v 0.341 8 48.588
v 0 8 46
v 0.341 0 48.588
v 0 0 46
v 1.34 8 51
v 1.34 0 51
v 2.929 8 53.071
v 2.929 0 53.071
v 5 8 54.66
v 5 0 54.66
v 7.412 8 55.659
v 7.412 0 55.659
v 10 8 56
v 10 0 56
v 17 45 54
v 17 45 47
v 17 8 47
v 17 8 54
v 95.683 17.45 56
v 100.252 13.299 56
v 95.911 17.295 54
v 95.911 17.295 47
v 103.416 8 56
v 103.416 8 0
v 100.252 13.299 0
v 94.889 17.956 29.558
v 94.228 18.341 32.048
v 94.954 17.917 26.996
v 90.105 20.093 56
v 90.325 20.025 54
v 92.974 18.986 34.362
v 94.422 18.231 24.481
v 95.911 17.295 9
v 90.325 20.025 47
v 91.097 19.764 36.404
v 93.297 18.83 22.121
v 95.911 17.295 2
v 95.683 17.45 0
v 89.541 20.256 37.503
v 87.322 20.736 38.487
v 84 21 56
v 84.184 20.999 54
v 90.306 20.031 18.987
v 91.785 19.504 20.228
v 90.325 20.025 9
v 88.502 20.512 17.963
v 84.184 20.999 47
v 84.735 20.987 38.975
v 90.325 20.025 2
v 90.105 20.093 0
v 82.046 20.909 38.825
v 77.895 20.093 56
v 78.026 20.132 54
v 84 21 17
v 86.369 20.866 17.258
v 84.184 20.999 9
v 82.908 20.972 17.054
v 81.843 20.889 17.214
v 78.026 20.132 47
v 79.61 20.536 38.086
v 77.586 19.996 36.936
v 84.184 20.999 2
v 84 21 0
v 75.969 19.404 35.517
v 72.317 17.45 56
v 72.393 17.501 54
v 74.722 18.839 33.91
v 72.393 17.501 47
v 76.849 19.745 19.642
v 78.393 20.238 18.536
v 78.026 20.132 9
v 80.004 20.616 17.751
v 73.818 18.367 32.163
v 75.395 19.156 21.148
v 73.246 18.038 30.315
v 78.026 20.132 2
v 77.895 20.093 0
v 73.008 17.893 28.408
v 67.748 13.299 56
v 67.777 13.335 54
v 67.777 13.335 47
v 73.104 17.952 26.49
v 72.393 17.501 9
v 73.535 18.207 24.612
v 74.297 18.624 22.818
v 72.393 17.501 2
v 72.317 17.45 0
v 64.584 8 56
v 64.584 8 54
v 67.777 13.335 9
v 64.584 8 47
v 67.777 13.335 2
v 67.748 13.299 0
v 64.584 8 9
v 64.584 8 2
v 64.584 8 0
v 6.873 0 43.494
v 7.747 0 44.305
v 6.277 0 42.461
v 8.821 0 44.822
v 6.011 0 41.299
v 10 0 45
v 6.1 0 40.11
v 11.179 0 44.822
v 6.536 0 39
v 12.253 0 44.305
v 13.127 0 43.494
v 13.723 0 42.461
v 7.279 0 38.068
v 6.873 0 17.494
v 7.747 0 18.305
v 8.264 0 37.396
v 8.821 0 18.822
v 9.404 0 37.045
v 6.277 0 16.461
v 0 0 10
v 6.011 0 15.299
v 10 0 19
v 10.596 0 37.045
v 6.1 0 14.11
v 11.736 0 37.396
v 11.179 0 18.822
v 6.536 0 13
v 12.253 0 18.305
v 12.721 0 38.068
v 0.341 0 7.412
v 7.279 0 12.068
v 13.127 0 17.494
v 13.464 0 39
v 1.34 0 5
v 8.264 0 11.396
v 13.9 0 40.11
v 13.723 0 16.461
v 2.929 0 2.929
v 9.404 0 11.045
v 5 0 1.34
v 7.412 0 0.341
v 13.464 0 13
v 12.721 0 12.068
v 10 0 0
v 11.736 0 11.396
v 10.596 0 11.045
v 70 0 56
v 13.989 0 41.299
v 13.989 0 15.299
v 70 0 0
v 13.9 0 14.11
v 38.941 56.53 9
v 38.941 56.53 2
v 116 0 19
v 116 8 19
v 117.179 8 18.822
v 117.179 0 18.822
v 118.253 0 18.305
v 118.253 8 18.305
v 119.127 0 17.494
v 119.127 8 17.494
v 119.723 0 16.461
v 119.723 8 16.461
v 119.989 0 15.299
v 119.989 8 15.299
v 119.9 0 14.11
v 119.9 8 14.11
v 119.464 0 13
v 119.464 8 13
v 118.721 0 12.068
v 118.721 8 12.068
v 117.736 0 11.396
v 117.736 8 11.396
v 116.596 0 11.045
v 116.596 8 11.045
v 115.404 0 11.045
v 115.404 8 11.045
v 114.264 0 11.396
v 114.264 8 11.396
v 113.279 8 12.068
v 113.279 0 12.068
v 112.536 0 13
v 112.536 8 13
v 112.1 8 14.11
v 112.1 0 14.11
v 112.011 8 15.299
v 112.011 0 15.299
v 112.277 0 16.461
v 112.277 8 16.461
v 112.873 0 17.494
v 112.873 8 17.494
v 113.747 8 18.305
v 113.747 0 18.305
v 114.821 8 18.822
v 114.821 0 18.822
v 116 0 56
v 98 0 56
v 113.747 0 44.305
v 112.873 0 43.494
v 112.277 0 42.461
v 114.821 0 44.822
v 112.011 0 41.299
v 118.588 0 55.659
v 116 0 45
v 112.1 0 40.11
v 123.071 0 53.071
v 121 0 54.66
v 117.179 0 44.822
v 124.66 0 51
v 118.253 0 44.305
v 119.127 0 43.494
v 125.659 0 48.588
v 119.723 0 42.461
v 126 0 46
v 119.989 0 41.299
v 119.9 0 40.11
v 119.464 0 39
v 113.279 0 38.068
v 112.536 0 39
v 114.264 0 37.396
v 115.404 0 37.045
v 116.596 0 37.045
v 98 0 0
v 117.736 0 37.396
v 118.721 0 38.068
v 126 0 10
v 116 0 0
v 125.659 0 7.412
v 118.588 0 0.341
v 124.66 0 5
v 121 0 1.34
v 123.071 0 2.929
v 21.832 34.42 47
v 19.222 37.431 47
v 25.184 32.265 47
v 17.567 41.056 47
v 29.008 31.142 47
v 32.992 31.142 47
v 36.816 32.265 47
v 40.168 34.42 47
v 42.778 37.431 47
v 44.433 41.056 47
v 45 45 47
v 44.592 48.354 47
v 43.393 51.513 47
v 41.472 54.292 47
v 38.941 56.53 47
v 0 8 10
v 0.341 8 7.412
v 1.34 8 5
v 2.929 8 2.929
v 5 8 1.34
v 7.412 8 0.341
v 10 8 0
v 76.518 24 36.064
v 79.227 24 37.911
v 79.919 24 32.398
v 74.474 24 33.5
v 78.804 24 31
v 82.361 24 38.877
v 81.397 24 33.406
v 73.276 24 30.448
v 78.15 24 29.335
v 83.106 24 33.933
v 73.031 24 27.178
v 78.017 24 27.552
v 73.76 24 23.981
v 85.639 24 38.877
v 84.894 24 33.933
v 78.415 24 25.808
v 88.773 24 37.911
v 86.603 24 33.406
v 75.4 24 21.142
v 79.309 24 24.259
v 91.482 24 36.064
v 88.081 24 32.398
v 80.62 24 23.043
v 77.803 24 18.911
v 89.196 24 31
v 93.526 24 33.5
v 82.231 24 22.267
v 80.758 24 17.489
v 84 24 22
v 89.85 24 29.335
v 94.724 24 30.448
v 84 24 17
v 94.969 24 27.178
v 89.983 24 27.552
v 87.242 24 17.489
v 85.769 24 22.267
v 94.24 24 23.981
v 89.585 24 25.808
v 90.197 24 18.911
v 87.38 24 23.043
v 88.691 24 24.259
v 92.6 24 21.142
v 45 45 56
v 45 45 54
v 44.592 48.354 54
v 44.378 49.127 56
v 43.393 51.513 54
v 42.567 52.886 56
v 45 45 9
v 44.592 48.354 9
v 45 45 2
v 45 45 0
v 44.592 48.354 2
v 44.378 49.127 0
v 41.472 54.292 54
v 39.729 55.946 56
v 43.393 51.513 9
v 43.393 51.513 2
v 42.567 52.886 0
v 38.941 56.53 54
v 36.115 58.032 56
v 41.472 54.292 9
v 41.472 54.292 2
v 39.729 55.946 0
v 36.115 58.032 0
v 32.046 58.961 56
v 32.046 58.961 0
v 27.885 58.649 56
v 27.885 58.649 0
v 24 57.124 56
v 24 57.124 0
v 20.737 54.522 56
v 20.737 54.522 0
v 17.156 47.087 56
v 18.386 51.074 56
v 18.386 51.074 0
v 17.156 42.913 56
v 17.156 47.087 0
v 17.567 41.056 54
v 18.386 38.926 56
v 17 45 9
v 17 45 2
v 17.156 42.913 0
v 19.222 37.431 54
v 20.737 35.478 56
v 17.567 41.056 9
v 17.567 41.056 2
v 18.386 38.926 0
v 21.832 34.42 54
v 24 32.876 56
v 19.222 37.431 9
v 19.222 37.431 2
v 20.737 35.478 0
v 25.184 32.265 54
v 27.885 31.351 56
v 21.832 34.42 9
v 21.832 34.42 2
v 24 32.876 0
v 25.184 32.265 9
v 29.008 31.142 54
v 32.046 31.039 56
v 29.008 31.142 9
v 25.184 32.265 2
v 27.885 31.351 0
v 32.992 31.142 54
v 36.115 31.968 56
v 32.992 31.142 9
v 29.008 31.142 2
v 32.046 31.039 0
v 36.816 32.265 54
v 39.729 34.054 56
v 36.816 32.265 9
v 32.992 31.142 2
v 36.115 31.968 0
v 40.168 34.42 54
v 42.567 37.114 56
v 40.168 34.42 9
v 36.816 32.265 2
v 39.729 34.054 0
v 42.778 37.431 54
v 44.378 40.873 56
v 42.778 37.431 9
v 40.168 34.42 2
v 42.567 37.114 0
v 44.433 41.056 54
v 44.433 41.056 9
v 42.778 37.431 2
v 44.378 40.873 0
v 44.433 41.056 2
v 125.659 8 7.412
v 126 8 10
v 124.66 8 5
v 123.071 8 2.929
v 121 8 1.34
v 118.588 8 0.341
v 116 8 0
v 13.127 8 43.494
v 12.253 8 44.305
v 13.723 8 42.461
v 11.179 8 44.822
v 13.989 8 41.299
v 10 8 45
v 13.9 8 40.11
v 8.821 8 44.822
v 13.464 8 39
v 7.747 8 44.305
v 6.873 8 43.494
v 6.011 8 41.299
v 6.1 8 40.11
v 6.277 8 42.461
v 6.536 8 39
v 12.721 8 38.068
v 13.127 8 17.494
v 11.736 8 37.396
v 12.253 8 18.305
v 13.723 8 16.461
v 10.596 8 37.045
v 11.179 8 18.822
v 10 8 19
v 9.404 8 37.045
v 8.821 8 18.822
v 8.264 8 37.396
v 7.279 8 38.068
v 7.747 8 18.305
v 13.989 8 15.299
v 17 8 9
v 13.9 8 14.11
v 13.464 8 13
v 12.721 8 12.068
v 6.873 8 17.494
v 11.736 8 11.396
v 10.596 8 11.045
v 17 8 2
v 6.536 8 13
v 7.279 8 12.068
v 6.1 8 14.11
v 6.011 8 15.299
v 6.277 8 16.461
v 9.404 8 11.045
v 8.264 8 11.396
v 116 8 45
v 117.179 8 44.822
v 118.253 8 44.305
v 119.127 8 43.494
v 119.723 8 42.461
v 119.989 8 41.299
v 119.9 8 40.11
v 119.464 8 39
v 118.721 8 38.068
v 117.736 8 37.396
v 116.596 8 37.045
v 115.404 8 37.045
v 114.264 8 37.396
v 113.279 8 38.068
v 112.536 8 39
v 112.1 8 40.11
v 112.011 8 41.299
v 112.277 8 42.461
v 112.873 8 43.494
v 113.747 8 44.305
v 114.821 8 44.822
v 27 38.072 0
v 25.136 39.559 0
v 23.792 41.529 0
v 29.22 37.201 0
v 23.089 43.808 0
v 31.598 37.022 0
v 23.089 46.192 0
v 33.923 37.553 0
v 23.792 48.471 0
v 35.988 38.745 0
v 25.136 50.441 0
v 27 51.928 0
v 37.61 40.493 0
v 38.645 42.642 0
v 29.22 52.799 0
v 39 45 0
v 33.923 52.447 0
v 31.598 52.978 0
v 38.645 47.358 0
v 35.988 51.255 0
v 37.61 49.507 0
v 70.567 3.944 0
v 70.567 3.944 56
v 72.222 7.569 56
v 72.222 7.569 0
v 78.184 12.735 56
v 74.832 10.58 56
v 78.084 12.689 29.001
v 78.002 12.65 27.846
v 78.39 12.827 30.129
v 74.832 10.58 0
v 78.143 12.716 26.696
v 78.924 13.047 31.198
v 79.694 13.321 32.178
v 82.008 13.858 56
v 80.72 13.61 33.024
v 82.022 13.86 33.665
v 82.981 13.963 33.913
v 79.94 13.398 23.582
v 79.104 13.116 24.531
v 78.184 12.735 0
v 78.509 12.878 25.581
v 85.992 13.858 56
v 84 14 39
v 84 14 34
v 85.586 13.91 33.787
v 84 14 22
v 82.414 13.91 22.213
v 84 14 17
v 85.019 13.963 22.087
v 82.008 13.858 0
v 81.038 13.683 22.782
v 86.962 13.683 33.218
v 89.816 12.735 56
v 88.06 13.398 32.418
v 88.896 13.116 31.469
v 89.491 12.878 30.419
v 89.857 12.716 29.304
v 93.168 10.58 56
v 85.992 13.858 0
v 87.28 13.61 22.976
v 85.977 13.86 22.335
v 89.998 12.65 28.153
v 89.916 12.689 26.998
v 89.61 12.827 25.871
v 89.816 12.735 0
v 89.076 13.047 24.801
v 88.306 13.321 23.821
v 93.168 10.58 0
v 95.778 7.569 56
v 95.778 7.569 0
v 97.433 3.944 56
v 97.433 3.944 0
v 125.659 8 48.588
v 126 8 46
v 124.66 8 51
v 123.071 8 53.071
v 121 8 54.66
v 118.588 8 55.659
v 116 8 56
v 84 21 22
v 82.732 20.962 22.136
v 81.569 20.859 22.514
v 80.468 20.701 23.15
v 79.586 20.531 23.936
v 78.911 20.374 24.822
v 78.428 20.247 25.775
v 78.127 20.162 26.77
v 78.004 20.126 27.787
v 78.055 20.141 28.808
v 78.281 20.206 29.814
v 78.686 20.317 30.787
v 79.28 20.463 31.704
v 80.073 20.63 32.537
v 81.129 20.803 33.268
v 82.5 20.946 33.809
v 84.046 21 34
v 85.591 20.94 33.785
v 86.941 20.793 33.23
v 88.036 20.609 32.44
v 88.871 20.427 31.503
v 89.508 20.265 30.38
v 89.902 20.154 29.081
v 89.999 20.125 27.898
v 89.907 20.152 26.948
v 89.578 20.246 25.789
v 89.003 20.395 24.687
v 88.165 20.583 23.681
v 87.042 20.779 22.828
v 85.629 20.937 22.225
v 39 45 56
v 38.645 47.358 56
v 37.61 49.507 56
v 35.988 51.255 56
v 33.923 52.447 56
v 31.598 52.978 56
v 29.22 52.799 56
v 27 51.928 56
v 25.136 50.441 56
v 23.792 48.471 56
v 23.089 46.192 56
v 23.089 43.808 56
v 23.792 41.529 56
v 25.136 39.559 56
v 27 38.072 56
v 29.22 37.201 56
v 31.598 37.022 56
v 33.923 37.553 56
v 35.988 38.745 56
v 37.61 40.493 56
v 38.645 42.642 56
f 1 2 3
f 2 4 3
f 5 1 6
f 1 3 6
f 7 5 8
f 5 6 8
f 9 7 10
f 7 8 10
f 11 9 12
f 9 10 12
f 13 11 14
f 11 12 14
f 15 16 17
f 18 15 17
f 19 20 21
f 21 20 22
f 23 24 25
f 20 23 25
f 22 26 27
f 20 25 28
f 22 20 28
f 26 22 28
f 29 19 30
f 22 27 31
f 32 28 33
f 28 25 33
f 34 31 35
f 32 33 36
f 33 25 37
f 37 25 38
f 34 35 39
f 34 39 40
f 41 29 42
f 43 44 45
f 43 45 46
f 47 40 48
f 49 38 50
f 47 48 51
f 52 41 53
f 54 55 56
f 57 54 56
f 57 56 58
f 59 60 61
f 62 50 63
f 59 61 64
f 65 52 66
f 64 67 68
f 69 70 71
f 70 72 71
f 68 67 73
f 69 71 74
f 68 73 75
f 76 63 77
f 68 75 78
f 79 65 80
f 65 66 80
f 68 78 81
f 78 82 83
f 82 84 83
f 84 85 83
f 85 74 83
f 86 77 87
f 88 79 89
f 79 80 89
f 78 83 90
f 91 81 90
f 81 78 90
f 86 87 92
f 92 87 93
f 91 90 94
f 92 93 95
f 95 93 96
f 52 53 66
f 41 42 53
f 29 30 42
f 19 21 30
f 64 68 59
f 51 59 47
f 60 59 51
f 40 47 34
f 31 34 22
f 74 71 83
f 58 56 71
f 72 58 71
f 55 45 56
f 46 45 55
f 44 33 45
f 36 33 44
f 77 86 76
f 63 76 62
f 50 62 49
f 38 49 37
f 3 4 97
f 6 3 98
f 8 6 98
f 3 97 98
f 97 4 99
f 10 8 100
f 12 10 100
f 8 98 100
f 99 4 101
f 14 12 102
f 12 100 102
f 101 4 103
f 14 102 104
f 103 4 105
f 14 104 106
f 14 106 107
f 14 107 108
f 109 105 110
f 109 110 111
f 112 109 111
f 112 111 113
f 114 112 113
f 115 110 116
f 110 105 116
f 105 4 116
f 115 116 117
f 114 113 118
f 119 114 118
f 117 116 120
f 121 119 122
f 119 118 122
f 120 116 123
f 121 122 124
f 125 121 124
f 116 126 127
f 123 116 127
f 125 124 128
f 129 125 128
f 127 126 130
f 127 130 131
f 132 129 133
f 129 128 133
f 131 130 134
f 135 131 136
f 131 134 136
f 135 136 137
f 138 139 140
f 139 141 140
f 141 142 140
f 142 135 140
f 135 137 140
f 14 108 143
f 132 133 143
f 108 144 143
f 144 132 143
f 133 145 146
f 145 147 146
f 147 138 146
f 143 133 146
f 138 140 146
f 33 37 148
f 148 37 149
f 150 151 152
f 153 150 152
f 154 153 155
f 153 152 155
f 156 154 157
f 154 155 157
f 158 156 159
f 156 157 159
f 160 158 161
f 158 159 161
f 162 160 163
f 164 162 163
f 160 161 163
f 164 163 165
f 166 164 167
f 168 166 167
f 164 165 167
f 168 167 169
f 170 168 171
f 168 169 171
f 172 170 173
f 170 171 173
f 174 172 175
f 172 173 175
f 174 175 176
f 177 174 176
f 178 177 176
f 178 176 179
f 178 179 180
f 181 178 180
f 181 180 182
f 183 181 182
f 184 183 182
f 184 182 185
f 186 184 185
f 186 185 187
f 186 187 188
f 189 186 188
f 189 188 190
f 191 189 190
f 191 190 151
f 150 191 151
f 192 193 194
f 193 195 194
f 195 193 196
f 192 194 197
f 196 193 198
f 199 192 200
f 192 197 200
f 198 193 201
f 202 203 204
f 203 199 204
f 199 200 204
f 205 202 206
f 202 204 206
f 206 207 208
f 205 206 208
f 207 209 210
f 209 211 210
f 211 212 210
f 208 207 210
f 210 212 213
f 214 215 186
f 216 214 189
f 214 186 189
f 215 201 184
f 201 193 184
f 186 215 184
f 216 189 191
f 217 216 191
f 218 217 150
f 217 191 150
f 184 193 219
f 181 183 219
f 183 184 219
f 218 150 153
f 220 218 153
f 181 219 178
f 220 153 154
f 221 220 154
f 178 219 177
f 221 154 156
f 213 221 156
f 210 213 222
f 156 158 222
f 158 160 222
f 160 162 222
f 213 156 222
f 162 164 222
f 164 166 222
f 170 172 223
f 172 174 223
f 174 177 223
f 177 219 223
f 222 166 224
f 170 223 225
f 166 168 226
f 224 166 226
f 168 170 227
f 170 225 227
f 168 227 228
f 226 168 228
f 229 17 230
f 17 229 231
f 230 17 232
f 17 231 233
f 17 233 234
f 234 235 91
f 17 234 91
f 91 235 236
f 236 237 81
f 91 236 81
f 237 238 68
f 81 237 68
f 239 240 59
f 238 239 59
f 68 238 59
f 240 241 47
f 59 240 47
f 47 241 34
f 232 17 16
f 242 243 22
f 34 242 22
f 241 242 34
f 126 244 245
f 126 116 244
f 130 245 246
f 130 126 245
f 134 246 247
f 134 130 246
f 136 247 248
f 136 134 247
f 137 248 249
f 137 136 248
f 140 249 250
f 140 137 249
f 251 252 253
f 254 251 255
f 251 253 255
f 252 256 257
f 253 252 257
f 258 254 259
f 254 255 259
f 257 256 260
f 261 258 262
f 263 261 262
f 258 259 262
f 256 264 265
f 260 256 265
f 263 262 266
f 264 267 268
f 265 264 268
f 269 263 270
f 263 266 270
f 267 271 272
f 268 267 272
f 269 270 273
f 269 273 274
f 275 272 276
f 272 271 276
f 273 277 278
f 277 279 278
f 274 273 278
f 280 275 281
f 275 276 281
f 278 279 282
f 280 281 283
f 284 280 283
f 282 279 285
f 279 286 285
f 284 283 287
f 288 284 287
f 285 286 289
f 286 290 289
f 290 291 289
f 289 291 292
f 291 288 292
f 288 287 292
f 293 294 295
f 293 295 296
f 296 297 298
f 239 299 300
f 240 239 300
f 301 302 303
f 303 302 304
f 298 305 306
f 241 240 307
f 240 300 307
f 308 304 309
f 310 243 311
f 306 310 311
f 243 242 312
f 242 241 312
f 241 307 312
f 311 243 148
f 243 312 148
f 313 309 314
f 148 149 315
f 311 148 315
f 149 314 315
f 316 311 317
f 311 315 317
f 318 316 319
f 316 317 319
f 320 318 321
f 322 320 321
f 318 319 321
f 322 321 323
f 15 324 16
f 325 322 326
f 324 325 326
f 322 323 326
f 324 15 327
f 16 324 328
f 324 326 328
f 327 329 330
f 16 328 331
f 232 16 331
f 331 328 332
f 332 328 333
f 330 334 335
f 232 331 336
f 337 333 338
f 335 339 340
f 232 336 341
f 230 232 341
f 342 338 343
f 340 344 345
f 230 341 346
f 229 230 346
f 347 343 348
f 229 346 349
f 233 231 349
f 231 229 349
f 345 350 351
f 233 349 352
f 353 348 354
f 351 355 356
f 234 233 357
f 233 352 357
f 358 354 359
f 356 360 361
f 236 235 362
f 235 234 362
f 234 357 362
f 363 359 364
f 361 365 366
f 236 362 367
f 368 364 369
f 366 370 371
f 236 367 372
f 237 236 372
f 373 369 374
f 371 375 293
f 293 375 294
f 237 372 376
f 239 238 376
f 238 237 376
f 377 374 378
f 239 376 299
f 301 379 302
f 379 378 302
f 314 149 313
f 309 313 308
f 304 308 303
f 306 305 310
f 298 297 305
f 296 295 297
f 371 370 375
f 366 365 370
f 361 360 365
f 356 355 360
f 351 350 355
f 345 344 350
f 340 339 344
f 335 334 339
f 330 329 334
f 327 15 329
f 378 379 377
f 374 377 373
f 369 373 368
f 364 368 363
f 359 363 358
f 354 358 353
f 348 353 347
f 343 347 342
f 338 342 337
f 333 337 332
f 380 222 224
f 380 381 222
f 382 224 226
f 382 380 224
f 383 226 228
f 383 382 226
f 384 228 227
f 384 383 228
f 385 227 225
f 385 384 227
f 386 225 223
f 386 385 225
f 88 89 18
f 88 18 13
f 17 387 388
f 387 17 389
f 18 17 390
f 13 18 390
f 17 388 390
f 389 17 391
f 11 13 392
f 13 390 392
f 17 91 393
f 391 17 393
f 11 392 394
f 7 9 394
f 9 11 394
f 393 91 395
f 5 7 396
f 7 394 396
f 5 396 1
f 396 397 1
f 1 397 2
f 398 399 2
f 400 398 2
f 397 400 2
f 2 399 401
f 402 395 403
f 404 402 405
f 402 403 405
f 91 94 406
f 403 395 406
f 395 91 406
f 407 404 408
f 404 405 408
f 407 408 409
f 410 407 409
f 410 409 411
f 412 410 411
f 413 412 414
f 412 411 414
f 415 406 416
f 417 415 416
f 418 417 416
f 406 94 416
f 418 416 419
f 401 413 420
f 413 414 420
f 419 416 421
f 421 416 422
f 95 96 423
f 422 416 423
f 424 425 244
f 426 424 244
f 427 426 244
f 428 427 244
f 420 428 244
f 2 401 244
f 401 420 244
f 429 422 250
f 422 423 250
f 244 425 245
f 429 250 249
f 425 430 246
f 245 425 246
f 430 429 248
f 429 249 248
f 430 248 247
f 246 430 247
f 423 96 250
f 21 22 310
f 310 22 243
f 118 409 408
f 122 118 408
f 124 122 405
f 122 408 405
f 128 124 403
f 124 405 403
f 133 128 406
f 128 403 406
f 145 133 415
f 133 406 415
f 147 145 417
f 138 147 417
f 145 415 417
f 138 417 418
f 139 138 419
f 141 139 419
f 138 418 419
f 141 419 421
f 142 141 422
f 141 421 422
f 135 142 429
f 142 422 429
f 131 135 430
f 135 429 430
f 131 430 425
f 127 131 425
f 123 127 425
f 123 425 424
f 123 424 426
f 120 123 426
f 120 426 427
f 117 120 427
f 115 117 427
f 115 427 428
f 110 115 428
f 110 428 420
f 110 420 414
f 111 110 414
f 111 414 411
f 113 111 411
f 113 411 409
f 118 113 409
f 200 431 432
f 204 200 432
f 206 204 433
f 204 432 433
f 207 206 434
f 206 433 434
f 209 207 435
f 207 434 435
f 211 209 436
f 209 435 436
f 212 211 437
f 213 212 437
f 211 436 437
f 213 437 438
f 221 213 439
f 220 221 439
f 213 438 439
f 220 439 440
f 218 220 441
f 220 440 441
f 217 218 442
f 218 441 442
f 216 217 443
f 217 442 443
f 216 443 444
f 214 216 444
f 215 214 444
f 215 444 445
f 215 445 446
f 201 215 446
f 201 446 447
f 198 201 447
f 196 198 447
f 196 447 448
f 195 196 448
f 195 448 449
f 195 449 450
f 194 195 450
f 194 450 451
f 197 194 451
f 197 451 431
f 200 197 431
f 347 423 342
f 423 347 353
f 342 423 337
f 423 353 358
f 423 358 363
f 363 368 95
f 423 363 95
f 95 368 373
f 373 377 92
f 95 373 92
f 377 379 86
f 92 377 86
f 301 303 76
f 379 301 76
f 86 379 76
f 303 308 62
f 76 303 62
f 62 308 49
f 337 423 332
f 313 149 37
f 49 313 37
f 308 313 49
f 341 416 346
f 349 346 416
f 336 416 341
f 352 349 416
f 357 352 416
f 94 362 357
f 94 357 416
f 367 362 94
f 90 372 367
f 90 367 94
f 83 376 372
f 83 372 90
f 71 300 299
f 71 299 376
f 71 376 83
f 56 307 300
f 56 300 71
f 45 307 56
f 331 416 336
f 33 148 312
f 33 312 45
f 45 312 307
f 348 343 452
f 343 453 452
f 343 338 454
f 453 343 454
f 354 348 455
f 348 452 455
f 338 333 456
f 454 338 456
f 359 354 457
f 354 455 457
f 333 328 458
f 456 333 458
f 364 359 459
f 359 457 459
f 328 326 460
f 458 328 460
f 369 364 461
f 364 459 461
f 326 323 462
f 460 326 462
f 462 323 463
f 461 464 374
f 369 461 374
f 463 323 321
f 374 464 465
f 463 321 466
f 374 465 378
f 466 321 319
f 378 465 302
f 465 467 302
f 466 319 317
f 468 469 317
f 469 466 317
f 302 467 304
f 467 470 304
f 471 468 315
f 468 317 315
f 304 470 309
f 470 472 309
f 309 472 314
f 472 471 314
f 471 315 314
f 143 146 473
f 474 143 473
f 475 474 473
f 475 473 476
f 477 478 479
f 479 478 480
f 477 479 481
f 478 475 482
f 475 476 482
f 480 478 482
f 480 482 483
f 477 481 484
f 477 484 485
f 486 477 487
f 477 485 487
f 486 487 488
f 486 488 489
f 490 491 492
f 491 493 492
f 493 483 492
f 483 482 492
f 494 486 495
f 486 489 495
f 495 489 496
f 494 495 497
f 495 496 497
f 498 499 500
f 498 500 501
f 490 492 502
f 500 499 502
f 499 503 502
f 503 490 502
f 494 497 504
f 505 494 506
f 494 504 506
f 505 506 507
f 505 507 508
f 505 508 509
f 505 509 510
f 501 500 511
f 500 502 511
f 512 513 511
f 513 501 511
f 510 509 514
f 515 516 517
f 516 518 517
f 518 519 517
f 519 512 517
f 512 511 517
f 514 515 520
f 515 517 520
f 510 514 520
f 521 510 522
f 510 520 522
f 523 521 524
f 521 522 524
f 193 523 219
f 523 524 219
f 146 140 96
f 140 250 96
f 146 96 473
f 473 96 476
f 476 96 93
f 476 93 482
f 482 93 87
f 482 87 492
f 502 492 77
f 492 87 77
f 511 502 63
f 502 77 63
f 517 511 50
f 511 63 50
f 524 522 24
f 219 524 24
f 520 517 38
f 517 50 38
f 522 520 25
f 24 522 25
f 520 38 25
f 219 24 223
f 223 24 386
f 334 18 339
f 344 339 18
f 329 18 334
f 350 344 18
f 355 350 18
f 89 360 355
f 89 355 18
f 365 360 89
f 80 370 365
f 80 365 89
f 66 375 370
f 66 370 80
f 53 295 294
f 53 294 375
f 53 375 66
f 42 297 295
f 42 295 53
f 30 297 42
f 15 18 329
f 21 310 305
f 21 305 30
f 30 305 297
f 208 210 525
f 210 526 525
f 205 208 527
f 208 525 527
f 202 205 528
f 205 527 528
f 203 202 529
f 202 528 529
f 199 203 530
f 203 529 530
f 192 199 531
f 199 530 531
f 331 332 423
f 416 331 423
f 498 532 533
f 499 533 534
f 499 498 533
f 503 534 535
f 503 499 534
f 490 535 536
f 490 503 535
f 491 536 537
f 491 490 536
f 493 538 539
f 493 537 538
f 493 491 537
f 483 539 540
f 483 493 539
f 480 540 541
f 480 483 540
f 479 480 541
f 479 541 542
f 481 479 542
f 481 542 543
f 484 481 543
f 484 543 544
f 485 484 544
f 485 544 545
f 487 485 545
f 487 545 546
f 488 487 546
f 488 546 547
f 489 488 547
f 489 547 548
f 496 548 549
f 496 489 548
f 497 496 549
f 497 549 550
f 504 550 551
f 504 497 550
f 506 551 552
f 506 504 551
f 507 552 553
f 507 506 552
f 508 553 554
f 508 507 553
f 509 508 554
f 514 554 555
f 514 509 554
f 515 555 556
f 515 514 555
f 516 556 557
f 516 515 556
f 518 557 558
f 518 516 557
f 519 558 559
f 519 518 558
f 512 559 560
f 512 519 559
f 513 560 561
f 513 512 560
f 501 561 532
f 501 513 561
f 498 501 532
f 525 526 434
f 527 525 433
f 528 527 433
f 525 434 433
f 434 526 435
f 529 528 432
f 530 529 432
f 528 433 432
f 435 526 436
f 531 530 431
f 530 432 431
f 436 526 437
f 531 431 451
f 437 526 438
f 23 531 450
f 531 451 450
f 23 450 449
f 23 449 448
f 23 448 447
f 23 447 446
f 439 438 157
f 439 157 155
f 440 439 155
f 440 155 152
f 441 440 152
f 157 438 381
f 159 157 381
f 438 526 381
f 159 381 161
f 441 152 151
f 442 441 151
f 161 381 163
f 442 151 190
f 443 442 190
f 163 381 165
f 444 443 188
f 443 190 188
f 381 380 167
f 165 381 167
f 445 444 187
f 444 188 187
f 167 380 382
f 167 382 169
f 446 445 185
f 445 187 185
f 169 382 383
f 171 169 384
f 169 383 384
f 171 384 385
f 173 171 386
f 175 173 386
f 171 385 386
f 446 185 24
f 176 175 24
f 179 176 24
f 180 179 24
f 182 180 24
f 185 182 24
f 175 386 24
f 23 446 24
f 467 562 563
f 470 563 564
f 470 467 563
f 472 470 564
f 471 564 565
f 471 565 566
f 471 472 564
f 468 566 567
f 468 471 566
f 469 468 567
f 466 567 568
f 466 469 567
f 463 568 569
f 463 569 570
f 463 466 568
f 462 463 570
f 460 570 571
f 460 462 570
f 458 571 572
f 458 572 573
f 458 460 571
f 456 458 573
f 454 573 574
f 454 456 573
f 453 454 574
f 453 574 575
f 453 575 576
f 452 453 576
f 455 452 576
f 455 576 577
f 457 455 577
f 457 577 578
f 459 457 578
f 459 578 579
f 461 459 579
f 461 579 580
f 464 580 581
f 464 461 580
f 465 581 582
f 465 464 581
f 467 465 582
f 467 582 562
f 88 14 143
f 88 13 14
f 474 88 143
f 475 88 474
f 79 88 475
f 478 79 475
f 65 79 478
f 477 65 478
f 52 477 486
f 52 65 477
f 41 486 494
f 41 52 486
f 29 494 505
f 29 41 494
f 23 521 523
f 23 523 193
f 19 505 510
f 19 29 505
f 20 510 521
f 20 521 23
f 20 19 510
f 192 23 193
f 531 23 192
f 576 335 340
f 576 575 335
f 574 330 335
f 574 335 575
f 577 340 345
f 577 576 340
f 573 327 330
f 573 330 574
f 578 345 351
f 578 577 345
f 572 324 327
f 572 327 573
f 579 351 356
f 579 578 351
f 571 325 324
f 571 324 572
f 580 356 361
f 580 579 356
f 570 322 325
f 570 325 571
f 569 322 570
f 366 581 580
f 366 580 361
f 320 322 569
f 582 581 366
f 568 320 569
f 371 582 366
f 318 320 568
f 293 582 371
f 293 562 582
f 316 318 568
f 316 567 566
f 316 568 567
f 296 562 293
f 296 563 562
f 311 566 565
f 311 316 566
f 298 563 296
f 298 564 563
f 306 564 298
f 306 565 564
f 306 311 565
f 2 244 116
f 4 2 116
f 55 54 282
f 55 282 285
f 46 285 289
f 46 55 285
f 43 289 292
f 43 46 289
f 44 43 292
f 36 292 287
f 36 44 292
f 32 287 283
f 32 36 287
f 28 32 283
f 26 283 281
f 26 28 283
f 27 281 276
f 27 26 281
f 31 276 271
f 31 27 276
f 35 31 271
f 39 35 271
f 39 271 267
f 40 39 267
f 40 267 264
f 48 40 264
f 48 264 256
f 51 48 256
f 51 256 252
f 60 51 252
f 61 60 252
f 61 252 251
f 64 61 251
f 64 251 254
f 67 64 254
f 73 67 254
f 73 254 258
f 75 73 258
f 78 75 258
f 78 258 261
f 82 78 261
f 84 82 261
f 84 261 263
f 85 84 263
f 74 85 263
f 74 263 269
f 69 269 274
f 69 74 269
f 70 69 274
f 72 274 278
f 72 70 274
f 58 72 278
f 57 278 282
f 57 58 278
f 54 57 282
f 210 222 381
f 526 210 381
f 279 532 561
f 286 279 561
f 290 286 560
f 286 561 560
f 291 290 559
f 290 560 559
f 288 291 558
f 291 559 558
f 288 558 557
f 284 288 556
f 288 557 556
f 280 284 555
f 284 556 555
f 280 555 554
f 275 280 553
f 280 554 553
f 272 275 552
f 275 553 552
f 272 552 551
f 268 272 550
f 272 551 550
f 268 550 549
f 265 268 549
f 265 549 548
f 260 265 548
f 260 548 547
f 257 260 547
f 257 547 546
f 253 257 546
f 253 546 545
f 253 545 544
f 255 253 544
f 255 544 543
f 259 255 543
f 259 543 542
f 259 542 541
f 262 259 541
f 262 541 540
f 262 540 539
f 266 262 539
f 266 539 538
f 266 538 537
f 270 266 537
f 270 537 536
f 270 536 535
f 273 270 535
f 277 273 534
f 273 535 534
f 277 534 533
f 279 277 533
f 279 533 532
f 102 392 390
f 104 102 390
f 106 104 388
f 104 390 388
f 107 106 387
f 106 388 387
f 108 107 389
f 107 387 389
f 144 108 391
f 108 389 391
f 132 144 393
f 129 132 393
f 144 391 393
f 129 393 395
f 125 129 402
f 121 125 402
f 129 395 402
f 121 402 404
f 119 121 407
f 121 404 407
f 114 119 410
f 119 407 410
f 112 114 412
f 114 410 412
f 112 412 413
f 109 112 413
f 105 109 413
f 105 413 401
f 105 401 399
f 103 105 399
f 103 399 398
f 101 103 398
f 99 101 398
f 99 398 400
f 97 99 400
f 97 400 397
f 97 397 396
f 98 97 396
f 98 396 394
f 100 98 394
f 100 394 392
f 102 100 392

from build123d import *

# Parameters (mm, degrees)
BOSS_EXTRUDE1_DEPTH = 56
FILLET1_R           = 10
SKETCH2_R           = 4
CUT_EXTRUDE1_DEPTH  = 56
SKETCH4_R           = 11
SKETCH4_R_2         = 6
BOSS_EXTRUDE2_DEPTH = 10
CUT_EXTRUDE2_START  = -34
SKETCH5_R           = 6
CUT_EXTRUDE2_DEPTH  = 34
SKETCH6_R           = 14
SKETCH6_R_2         = 8
BOSS_EXTRUDE3_DEPTH = 56
BOSS_EXTRUDE4_START = -7
BOSS_EXTRUDE4_DEPTH = 7
BOSS_EXTRUDE5_DEPTH = 7


with BuildPart() as part:
    # Sketch1 → Boss-Extrude1 (new body)
    with BuildSketch(Plane.XY):
        with BuildLine():
            Line((0, 0), (70, 0))
            ThreePointArc((70, 0), (84, 14), (98, 0))
            Line((98, 0), (126, 0))
            Line((126, 0), (126, 8))
            Line((126, 8), (103.416487839, 8))
            ThreePointArc((103.416487839, 8), (84, 21), (64.583512161, 8))
            Line((64.583512161, 8), (0, 8))
            Line((0, 8), (0, 0))
        make_face()
    extrude(amount=BOSS_EXTRUDE1_DEPTH)

    # Fillet1
    fillet1_edges = [part.edges().sort_by_distance(p)[0] for p in [
        (0, 4, 0),
        (126, 4, 56),
        (0, 4, 56),
        (126, 4, 0),
    ]]
    fillet(fillet1_edges, radius=FILLET1_R)

    # Sketch2 → Cut-Extrude1 (cut)
    with BuildSketch(Plane(origin=(0, 8, 0), x_dir=(1, 0, 0), z_dir=(0, 1, 0))):
        with Locations(Location((10, -15, 0), (0, 0, 270))):
            Circle(SKETCH2_R)
        with Locations(Location((10, -41, 0), (0, 0, 270))):
            Circle(SKETCH2_R)
        with Locations(Location((116, -15, 0), (0, 0, 270))):
            Circle(SKETCH2_R)
        with Locations(Location((116, -41, 0), (0, 0, 270))):
            Circle(SKETCH2_R)
    extrude(amount=-CUT_EXTRUDE1_DEPTH, mode=Mode.SUBTRACT)

    # Sketch4 → Boss-Extrude2 (add)
    with BuildSketch(Plane(origin=(0, 14, 0), x_dir=(-1, 0, 0), z_dir=(0, -1, 0))):
        with Locations(Location((-84, -28, 0), (0, 0, 90))):
            Circle(SKETCH4_R)
        with Locations(Location((-84, -28, 0), (0, 0, 90))):
            Circle(SKETCH4_R_2, mode=Mode.SUBTRACT)
    extrude(amount=-BOSS_EXTRUDE2_DEPTH)

    # Sketch5 → Cut-Extrude2 (cut)
    with BuildSketch(Plane(origin=(0, 24, 0), x_dir=(1, 0, 0), z_dir=(0, 1, 0)).offset(CUT_EXTRUDE2_START)):
        with Locations(Location((84, -28, 0), (0, 0, 90))):
            Circle(SKETCH5_R)
    extrude(amount=CUT_EXTRUDE2_DEPTH, mode=Mode.SUBTRACT)



with BuildPart() as body_2:
    # Sketch6 → Boss-Extrude3 (new body)
    with BuildSketch(Plane.XY):
        with Locations((31, 45)):
            Circle(SKETCH6_R)
        with Locations((31, 45)):
            Circle(SKETCH6_R_2, mode=Mode.SUBTRACT)
    extrude(amount=BOSS_EXTRUDE3_DEPTH)


with BuildPart() as part_1:
    add(part.part)

    add(body_2.part)  # Boss-Extrude4 merges body 2
    # Sketch7 → Boss-Extrude4 (add)
    with BuildSketch(Plane.XY.offset(54).offset(BOSS_EXTRUDE4_START)):
        with BuildLine():
            Line((17, 45), (17, 8))
            Line((17, 8), (64.583512161, 8))
            ThreePointArc((64.583512161, 8), (78.026449954, 20.132478731), (95.911075968, 17.295267251))
            Line((95.911075968, 17.295267251), (38.940717312, 56.530178167))
            ThreePointArc((38.940717312, 56.530178167), (37.512678314, 32.607057606), (17, 45))
        make_face()
    extrude(amount=BOSS_EXTRUDE4_DEPTH)

    # Sketch8 → Boss-Extrude5 (add)
    with BuildSketch(Plane(origin=(0, 0, 2), x_dir=(-1, 0, 0), z_dir=(0, 0, -1))):
        with BuildLine():
            Line((-17, 45), (-17, 8))
            Line((-17, 8), (-64.583512161, 8))
            ThreePointArc((-64.583512161, 8), (-78.026449954, 20.132478731), (-95.911075968, 17.295267251))
            Line((-95.911075968, 17.295267251), (-38.940717312, 56.530178167))
            ThreePointArc((-38.940717312, 56.530178167), (-37.512678314, 32.607057606), (-17, 45))
        make_face()
    extrude(amount=-BOSS_EXTRUDE5_DEPTH)


solid = part_1.part
